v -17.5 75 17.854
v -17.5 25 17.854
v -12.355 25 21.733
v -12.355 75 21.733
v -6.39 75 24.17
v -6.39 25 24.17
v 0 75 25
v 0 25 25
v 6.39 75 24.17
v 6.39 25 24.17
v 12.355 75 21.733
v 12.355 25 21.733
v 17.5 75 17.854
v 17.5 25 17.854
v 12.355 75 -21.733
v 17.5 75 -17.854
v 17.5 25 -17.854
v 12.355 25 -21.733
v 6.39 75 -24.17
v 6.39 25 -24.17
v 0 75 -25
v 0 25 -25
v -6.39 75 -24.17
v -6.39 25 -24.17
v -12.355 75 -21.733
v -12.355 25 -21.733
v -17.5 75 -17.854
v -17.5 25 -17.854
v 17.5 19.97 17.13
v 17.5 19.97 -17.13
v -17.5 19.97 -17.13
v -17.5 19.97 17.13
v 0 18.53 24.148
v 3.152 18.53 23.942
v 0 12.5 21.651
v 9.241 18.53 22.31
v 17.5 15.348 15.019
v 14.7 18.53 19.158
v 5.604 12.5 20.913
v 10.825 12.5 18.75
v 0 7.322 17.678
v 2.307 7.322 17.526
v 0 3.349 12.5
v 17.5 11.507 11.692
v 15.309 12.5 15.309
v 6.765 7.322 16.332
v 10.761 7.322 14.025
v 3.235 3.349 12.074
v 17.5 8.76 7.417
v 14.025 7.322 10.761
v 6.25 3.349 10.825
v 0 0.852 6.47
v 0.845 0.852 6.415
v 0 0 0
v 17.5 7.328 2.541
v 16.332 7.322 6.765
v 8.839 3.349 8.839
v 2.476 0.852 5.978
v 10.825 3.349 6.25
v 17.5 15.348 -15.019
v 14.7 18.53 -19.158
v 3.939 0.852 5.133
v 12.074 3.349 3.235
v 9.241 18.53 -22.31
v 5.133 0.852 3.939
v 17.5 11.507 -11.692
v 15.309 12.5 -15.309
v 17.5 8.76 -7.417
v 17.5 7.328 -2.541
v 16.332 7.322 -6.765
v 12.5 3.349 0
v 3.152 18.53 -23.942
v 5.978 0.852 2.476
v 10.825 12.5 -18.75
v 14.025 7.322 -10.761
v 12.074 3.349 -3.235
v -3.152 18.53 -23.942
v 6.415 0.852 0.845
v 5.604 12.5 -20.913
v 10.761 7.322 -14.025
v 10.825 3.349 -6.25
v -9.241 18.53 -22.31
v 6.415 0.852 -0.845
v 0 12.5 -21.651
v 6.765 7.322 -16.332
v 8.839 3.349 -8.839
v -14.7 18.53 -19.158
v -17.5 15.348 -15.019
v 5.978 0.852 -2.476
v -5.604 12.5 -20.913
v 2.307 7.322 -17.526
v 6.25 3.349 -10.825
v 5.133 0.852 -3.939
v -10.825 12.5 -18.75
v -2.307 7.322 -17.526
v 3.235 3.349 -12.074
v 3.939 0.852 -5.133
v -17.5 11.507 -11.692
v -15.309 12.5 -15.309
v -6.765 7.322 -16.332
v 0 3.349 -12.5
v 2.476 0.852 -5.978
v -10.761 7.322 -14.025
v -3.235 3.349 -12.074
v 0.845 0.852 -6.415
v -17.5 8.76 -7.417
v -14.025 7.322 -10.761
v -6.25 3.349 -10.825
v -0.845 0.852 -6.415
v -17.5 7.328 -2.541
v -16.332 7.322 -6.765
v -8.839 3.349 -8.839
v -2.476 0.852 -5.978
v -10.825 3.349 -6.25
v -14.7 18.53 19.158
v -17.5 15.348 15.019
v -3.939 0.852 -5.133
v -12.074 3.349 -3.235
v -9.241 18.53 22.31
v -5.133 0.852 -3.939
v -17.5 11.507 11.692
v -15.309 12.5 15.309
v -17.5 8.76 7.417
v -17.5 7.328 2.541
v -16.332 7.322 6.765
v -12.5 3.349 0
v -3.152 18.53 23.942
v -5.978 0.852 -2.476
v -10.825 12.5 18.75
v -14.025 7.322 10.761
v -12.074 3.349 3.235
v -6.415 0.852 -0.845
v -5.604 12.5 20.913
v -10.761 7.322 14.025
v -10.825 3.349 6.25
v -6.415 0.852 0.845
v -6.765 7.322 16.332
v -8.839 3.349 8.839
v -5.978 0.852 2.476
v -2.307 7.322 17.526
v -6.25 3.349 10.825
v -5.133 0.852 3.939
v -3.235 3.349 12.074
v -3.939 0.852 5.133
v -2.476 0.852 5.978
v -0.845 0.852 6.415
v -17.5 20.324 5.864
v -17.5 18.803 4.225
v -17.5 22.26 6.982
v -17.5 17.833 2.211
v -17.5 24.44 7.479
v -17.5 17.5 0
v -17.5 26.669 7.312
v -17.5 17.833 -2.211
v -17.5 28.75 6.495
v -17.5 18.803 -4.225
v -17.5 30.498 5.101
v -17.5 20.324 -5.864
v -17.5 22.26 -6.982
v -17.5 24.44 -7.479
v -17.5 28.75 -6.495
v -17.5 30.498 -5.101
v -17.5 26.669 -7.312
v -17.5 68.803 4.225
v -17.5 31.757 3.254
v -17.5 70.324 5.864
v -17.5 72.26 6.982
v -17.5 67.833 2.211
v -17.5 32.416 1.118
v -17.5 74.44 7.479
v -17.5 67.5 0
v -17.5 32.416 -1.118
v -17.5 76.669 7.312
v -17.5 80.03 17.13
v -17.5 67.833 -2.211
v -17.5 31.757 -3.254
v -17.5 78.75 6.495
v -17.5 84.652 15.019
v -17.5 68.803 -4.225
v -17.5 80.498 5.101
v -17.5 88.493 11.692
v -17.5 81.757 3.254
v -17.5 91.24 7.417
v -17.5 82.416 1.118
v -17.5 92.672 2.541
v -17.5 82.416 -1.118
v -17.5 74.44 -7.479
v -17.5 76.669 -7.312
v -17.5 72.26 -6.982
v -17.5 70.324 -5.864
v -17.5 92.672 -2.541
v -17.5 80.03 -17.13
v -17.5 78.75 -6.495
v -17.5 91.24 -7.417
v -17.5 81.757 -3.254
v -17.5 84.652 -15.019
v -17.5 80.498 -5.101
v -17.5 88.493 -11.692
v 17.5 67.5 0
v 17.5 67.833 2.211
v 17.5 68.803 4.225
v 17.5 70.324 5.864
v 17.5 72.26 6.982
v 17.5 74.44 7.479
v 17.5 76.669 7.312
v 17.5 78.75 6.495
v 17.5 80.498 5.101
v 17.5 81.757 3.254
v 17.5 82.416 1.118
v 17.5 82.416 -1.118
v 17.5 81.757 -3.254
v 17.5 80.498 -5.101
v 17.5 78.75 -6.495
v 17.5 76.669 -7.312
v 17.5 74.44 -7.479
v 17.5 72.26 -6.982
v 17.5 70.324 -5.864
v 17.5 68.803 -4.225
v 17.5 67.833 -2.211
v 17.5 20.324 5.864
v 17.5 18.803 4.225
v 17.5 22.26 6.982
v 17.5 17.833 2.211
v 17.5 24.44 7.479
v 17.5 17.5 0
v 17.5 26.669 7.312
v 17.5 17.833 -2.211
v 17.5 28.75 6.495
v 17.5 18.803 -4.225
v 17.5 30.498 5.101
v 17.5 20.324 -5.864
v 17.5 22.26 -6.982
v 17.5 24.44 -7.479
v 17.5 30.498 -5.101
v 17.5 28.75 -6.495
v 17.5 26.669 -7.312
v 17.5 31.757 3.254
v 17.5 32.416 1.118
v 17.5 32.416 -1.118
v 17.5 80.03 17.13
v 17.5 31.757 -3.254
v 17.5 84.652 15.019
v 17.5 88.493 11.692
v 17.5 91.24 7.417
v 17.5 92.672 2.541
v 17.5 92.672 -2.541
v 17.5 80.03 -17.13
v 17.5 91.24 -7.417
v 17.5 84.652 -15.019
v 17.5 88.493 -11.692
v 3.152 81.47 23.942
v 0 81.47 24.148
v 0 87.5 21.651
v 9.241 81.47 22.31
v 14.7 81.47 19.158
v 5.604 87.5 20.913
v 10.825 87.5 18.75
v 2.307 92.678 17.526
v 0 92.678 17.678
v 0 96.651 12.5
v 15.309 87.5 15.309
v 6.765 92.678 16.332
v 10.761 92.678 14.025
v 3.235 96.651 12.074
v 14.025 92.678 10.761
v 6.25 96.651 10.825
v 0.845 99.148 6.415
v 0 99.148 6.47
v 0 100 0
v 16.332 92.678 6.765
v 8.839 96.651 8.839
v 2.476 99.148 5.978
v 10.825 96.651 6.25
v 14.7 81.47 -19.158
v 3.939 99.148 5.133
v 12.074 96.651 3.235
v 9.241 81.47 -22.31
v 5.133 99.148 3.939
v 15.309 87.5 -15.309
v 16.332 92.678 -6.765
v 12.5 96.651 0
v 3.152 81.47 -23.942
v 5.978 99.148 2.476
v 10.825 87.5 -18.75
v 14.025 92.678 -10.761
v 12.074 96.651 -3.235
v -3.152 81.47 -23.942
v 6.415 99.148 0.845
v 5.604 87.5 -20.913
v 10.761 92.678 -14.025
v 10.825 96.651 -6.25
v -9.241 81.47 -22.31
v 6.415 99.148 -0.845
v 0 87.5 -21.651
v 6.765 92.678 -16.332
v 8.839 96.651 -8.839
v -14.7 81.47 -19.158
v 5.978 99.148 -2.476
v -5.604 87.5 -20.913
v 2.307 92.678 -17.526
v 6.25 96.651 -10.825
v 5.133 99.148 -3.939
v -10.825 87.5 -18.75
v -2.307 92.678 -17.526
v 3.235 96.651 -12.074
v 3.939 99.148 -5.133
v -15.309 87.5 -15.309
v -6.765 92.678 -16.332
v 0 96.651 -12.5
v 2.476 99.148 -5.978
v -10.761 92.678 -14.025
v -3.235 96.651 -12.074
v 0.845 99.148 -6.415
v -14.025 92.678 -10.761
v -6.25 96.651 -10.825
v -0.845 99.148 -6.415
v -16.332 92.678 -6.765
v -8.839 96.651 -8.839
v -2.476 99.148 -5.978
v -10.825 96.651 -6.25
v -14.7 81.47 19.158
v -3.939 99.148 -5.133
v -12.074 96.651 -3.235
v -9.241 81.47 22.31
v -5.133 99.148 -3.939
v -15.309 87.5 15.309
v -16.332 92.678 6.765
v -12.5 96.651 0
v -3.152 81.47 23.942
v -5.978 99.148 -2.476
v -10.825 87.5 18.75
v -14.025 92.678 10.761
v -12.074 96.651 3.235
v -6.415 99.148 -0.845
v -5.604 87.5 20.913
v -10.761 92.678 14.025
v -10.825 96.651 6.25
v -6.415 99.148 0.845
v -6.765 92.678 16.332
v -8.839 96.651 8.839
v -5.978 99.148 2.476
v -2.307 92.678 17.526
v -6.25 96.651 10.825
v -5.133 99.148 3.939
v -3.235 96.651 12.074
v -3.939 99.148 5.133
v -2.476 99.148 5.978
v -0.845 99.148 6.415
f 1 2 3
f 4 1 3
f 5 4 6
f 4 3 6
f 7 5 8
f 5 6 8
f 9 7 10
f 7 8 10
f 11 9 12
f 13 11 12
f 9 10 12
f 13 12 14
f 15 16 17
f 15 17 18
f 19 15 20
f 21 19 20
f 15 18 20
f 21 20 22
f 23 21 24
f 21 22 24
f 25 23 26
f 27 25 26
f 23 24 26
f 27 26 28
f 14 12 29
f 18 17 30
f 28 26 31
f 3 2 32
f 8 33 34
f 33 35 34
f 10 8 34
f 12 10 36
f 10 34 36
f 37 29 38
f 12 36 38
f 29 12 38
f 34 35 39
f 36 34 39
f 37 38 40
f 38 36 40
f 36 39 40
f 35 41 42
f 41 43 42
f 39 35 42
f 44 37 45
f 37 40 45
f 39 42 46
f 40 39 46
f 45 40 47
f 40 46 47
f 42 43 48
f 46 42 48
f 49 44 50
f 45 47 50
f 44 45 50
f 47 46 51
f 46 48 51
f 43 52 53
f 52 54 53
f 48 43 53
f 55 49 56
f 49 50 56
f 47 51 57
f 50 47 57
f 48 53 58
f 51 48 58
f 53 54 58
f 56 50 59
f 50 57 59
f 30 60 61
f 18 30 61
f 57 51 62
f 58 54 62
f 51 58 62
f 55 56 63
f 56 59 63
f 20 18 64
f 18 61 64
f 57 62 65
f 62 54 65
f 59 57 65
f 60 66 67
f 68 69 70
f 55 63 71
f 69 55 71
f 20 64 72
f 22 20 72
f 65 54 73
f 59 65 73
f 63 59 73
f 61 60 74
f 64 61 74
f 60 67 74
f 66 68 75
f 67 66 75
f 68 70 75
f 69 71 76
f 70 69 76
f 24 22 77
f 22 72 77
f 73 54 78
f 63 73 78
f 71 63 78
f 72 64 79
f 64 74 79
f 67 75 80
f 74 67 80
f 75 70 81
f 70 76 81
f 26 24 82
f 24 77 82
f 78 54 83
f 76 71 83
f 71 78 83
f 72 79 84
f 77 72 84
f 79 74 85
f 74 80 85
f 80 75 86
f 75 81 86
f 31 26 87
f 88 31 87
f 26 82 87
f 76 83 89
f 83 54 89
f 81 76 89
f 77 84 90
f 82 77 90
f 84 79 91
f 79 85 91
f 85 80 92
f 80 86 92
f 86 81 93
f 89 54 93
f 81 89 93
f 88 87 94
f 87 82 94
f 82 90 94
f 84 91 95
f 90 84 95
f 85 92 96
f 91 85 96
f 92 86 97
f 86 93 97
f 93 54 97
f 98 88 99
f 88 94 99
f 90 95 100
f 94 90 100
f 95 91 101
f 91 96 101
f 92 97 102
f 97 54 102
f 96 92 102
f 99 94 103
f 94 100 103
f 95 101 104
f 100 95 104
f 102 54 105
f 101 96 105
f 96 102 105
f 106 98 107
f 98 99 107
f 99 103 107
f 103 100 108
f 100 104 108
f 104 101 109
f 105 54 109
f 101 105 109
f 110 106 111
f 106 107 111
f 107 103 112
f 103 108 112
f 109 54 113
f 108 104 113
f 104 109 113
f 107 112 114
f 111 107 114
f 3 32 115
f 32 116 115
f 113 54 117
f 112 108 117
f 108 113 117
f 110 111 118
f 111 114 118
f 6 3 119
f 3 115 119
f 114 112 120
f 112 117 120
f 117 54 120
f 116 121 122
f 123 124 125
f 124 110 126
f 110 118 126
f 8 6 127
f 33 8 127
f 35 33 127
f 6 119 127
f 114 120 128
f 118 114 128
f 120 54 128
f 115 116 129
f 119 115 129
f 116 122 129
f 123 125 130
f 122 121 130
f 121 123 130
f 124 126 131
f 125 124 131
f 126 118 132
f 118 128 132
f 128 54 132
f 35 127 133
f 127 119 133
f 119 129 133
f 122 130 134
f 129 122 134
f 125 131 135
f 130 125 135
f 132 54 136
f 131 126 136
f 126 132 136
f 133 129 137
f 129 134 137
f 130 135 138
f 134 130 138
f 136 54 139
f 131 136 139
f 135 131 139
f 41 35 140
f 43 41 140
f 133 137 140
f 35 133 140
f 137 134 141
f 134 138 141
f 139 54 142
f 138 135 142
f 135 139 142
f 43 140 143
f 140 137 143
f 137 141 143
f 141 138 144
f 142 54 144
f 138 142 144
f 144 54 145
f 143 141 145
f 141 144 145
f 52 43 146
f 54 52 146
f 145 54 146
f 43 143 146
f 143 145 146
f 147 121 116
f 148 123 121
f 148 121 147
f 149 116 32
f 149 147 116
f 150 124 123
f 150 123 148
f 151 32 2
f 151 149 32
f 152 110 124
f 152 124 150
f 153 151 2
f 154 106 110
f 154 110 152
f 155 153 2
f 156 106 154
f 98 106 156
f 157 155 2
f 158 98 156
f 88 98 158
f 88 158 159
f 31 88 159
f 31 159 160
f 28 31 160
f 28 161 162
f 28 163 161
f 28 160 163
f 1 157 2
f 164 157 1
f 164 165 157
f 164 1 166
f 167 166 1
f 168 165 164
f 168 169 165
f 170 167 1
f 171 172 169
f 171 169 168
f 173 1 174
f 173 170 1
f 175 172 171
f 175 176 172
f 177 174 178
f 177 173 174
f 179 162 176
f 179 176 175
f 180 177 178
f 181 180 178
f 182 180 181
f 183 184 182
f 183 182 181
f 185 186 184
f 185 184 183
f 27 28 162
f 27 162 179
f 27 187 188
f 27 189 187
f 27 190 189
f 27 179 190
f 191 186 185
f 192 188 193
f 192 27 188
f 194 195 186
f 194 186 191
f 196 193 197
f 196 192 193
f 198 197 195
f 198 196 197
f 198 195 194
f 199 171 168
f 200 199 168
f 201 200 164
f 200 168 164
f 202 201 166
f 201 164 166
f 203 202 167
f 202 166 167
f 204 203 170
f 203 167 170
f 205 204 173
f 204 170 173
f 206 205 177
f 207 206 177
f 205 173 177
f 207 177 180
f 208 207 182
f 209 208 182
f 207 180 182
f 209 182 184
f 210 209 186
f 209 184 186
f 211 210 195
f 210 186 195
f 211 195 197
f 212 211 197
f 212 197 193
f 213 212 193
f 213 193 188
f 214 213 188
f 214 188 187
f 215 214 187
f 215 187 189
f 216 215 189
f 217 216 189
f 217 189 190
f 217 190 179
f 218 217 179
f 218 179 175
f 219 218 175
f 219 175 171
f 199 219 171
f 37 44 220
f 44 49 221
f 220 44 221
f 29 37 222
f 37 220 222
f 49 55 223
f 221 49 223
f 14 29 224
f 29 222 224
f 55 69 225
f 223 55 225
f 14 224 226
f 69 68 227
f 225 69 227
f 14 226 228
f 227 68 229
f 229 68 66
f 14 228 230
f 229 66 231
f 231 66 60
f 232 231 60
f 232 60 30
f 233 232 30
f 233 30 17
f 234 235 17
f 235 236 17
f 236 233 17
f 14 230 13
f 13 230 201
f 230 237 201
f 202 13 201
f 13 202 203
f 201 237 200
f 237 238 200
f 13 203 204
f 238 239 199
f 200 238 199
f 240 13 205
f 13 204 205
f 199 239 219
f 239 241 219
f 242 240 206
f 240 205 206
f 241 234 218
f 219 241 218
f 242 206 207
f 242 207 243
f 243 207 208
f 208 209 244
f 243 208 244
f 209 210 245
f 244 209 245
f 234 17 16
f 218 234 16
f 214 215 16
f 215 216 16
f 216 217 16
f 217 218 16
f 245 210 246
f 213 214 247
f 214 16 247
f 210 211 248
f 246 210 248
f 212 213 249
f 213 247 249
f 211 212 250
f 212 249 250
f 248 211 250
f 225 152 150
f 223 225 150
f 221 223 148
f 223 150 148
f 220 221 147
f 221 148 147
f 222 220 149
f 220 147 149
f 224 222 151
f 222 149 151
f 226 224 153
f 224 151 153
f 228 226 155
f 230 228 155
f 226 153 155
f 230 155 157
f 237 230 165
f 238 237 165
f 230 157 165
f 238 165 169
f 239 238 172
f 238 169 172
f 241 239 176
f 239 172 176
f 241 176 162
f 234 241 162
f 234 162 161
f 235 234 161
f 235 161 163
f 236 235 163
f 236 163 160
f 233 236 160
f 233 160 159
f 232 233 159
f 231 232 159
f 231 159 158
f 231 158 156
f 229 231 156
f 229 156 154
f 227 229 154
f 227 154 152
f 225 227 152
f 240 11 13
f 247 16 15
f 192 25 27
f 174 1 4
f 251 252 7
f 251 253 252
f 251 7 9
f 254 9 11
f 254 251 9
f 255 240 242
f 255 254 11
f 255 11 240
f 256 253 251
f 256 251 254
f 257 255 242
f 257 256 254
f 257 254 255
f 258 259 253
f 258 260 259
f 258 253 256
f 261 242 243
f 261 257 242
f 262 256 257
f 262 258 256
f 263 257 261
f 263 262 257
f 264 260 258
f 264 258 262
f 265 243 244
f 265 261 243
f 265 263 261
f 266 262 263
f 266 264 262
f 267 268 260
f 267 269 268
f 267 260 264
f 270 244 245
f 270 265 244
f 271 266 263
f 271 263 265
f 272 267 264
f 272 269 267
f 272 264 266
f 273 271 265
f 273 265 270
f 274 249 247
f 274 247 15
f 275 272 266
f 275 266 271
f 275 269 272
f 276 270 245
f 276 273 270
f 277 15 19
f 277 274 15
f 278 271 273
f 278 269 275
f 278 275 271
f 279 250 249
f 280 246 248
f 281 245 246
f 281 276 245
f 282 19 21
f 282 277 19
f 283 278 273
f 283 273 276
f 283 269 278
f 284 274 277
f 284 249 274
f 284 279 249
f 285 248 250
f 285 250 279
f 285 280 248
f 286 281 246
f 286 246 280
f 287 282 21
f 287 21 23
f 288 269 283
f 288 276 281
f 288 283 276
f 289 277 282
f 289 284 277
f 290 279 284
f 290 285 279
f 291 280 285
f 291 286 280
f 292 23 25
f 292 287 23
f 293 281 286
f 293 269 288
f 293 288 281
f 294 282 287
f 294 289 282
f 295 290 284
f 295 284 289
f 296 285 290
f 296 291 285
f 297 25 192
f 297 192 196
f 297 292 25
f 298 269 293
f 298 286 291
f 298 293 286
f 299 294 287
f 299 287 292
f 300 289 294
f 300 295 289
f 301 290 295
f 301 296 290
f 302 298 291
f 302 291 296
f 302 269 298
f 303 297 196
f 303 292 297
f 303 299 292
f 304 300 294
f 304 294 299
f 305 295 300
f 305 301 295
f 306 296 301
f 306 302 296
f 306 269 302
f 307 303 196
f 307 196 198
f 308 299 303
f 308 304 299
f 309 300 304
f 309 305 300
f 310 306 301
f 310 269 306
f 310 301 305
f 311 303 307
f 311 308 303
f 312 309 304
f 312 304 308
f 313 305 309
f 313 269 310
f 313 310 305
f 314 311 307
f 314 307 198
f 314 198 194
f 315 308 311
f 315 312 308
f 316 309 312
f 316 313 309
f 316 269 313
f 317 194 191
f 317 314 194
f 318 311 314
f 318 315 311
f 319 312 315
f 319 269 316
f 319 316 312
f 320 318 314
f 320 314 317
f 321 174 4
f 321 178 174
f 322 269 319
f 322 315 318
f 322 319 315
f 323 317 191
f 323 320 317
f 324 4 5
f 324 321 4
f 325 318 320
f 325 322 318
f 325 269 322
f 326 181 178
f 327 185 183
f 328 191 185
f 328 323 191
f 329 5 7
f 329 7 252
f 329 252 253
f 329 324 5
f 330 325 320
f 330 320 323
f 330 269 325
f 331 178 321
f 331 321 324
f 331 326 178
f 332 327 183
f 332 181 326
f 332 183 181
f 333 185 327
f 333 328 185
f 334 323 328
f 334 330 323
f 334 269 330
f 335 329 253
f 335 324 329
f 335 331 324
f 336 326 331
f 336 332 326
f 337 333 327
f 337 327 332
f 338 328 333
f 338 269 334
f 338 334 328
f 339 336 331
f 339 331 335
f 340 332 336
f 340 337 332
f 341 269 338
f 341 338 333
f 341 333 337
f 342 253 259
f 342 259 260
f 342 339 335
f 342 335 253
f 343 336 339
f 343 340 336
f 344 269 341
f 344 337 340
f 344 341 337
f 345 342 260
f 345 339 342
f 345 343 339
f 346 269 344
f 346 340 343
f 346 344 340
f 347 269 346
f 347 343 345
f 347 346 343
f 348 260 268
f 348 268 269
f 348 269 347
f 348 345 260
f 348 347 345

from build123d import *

# Parameters (mm, degrees)
SKETCH_1_R               = 25
EXTRUDE_1_DEPTH          = 100
FILLET_1_R               = 25
CUT_EXTRUDE_2_DEPTH      = 200
CUT_EXTRUDE_2_DEPTH_BACK = 200
SKETCH_2_OUTSIDE_W       = 76.494
SKETCH_2_OUTSIDE_H       = 126.494
SKETCH_2_OUTSIDE_W_2     = 35
SKETCH_2_OUTSIDE_H_2     = 100
SKETCH_3_R               = 7.5
CUT_EXTRUDE_3_DEPTH      = 109.857705285


with BuildPart() as part:
    # 草图1 → 拉伸1 (new body)
    with BuildSketch(Plane(origin=(0, 0, 0), x_dir=(1, 0, 0), z_dir=(0, 1, 0))):
        Circle(SKETCH_1_R)
    extrude(amount=EXTRUDE_1_DEPTH)

    # 圆角1
    fillet_1_edges = [part.edges().sort_by_distance(p)[0] for p in [
        (-25, 0, 0),
        (-25, 100, 0),
    ]]
    fillet(fillet_1_edges, radius=FILLET_1_R)

    # 草图2 outside → 拉伸2 (cut, two sides: drawn at the far end of the back side and taken through both)
    with BuildSketch(Plane.XY.offset(-CUT_EXTRUDE_2_DEPTH_BACK)):
        with Locations((0, 50)):
            Rectangle(SKETCH_2_OUTSIDE_W, SKETCH_2_OUTSIDE_H)
        with Locations((0, 50)):
            Rectangle(SKETCH_2_OUTSIDE_W_2, SKETCH_2_OUTSIDE_H_2, mode=Mode.SUBTRACT)
    extrude(amount=CUT_EXTRUDE_2_DEPTH + CUT_EXTRUDE_2_DEPTH_BACK, mode=Mode.SUBTRACT)

    # 草图3 → 拉伸3 (cut, through all)
    with BuildSketch(Plane.ZY.offset(17.5)):
        with Locations((0, 75)):
            Circle(SKETCH_3_R)
        with Locations((0, 25)):
            Circle(SKETCH_3_R)
    extrude(amount=-CUT_EXTRUDE_3_DEPTH, mode=Mode.SUBTRACT)


solid = part.part
